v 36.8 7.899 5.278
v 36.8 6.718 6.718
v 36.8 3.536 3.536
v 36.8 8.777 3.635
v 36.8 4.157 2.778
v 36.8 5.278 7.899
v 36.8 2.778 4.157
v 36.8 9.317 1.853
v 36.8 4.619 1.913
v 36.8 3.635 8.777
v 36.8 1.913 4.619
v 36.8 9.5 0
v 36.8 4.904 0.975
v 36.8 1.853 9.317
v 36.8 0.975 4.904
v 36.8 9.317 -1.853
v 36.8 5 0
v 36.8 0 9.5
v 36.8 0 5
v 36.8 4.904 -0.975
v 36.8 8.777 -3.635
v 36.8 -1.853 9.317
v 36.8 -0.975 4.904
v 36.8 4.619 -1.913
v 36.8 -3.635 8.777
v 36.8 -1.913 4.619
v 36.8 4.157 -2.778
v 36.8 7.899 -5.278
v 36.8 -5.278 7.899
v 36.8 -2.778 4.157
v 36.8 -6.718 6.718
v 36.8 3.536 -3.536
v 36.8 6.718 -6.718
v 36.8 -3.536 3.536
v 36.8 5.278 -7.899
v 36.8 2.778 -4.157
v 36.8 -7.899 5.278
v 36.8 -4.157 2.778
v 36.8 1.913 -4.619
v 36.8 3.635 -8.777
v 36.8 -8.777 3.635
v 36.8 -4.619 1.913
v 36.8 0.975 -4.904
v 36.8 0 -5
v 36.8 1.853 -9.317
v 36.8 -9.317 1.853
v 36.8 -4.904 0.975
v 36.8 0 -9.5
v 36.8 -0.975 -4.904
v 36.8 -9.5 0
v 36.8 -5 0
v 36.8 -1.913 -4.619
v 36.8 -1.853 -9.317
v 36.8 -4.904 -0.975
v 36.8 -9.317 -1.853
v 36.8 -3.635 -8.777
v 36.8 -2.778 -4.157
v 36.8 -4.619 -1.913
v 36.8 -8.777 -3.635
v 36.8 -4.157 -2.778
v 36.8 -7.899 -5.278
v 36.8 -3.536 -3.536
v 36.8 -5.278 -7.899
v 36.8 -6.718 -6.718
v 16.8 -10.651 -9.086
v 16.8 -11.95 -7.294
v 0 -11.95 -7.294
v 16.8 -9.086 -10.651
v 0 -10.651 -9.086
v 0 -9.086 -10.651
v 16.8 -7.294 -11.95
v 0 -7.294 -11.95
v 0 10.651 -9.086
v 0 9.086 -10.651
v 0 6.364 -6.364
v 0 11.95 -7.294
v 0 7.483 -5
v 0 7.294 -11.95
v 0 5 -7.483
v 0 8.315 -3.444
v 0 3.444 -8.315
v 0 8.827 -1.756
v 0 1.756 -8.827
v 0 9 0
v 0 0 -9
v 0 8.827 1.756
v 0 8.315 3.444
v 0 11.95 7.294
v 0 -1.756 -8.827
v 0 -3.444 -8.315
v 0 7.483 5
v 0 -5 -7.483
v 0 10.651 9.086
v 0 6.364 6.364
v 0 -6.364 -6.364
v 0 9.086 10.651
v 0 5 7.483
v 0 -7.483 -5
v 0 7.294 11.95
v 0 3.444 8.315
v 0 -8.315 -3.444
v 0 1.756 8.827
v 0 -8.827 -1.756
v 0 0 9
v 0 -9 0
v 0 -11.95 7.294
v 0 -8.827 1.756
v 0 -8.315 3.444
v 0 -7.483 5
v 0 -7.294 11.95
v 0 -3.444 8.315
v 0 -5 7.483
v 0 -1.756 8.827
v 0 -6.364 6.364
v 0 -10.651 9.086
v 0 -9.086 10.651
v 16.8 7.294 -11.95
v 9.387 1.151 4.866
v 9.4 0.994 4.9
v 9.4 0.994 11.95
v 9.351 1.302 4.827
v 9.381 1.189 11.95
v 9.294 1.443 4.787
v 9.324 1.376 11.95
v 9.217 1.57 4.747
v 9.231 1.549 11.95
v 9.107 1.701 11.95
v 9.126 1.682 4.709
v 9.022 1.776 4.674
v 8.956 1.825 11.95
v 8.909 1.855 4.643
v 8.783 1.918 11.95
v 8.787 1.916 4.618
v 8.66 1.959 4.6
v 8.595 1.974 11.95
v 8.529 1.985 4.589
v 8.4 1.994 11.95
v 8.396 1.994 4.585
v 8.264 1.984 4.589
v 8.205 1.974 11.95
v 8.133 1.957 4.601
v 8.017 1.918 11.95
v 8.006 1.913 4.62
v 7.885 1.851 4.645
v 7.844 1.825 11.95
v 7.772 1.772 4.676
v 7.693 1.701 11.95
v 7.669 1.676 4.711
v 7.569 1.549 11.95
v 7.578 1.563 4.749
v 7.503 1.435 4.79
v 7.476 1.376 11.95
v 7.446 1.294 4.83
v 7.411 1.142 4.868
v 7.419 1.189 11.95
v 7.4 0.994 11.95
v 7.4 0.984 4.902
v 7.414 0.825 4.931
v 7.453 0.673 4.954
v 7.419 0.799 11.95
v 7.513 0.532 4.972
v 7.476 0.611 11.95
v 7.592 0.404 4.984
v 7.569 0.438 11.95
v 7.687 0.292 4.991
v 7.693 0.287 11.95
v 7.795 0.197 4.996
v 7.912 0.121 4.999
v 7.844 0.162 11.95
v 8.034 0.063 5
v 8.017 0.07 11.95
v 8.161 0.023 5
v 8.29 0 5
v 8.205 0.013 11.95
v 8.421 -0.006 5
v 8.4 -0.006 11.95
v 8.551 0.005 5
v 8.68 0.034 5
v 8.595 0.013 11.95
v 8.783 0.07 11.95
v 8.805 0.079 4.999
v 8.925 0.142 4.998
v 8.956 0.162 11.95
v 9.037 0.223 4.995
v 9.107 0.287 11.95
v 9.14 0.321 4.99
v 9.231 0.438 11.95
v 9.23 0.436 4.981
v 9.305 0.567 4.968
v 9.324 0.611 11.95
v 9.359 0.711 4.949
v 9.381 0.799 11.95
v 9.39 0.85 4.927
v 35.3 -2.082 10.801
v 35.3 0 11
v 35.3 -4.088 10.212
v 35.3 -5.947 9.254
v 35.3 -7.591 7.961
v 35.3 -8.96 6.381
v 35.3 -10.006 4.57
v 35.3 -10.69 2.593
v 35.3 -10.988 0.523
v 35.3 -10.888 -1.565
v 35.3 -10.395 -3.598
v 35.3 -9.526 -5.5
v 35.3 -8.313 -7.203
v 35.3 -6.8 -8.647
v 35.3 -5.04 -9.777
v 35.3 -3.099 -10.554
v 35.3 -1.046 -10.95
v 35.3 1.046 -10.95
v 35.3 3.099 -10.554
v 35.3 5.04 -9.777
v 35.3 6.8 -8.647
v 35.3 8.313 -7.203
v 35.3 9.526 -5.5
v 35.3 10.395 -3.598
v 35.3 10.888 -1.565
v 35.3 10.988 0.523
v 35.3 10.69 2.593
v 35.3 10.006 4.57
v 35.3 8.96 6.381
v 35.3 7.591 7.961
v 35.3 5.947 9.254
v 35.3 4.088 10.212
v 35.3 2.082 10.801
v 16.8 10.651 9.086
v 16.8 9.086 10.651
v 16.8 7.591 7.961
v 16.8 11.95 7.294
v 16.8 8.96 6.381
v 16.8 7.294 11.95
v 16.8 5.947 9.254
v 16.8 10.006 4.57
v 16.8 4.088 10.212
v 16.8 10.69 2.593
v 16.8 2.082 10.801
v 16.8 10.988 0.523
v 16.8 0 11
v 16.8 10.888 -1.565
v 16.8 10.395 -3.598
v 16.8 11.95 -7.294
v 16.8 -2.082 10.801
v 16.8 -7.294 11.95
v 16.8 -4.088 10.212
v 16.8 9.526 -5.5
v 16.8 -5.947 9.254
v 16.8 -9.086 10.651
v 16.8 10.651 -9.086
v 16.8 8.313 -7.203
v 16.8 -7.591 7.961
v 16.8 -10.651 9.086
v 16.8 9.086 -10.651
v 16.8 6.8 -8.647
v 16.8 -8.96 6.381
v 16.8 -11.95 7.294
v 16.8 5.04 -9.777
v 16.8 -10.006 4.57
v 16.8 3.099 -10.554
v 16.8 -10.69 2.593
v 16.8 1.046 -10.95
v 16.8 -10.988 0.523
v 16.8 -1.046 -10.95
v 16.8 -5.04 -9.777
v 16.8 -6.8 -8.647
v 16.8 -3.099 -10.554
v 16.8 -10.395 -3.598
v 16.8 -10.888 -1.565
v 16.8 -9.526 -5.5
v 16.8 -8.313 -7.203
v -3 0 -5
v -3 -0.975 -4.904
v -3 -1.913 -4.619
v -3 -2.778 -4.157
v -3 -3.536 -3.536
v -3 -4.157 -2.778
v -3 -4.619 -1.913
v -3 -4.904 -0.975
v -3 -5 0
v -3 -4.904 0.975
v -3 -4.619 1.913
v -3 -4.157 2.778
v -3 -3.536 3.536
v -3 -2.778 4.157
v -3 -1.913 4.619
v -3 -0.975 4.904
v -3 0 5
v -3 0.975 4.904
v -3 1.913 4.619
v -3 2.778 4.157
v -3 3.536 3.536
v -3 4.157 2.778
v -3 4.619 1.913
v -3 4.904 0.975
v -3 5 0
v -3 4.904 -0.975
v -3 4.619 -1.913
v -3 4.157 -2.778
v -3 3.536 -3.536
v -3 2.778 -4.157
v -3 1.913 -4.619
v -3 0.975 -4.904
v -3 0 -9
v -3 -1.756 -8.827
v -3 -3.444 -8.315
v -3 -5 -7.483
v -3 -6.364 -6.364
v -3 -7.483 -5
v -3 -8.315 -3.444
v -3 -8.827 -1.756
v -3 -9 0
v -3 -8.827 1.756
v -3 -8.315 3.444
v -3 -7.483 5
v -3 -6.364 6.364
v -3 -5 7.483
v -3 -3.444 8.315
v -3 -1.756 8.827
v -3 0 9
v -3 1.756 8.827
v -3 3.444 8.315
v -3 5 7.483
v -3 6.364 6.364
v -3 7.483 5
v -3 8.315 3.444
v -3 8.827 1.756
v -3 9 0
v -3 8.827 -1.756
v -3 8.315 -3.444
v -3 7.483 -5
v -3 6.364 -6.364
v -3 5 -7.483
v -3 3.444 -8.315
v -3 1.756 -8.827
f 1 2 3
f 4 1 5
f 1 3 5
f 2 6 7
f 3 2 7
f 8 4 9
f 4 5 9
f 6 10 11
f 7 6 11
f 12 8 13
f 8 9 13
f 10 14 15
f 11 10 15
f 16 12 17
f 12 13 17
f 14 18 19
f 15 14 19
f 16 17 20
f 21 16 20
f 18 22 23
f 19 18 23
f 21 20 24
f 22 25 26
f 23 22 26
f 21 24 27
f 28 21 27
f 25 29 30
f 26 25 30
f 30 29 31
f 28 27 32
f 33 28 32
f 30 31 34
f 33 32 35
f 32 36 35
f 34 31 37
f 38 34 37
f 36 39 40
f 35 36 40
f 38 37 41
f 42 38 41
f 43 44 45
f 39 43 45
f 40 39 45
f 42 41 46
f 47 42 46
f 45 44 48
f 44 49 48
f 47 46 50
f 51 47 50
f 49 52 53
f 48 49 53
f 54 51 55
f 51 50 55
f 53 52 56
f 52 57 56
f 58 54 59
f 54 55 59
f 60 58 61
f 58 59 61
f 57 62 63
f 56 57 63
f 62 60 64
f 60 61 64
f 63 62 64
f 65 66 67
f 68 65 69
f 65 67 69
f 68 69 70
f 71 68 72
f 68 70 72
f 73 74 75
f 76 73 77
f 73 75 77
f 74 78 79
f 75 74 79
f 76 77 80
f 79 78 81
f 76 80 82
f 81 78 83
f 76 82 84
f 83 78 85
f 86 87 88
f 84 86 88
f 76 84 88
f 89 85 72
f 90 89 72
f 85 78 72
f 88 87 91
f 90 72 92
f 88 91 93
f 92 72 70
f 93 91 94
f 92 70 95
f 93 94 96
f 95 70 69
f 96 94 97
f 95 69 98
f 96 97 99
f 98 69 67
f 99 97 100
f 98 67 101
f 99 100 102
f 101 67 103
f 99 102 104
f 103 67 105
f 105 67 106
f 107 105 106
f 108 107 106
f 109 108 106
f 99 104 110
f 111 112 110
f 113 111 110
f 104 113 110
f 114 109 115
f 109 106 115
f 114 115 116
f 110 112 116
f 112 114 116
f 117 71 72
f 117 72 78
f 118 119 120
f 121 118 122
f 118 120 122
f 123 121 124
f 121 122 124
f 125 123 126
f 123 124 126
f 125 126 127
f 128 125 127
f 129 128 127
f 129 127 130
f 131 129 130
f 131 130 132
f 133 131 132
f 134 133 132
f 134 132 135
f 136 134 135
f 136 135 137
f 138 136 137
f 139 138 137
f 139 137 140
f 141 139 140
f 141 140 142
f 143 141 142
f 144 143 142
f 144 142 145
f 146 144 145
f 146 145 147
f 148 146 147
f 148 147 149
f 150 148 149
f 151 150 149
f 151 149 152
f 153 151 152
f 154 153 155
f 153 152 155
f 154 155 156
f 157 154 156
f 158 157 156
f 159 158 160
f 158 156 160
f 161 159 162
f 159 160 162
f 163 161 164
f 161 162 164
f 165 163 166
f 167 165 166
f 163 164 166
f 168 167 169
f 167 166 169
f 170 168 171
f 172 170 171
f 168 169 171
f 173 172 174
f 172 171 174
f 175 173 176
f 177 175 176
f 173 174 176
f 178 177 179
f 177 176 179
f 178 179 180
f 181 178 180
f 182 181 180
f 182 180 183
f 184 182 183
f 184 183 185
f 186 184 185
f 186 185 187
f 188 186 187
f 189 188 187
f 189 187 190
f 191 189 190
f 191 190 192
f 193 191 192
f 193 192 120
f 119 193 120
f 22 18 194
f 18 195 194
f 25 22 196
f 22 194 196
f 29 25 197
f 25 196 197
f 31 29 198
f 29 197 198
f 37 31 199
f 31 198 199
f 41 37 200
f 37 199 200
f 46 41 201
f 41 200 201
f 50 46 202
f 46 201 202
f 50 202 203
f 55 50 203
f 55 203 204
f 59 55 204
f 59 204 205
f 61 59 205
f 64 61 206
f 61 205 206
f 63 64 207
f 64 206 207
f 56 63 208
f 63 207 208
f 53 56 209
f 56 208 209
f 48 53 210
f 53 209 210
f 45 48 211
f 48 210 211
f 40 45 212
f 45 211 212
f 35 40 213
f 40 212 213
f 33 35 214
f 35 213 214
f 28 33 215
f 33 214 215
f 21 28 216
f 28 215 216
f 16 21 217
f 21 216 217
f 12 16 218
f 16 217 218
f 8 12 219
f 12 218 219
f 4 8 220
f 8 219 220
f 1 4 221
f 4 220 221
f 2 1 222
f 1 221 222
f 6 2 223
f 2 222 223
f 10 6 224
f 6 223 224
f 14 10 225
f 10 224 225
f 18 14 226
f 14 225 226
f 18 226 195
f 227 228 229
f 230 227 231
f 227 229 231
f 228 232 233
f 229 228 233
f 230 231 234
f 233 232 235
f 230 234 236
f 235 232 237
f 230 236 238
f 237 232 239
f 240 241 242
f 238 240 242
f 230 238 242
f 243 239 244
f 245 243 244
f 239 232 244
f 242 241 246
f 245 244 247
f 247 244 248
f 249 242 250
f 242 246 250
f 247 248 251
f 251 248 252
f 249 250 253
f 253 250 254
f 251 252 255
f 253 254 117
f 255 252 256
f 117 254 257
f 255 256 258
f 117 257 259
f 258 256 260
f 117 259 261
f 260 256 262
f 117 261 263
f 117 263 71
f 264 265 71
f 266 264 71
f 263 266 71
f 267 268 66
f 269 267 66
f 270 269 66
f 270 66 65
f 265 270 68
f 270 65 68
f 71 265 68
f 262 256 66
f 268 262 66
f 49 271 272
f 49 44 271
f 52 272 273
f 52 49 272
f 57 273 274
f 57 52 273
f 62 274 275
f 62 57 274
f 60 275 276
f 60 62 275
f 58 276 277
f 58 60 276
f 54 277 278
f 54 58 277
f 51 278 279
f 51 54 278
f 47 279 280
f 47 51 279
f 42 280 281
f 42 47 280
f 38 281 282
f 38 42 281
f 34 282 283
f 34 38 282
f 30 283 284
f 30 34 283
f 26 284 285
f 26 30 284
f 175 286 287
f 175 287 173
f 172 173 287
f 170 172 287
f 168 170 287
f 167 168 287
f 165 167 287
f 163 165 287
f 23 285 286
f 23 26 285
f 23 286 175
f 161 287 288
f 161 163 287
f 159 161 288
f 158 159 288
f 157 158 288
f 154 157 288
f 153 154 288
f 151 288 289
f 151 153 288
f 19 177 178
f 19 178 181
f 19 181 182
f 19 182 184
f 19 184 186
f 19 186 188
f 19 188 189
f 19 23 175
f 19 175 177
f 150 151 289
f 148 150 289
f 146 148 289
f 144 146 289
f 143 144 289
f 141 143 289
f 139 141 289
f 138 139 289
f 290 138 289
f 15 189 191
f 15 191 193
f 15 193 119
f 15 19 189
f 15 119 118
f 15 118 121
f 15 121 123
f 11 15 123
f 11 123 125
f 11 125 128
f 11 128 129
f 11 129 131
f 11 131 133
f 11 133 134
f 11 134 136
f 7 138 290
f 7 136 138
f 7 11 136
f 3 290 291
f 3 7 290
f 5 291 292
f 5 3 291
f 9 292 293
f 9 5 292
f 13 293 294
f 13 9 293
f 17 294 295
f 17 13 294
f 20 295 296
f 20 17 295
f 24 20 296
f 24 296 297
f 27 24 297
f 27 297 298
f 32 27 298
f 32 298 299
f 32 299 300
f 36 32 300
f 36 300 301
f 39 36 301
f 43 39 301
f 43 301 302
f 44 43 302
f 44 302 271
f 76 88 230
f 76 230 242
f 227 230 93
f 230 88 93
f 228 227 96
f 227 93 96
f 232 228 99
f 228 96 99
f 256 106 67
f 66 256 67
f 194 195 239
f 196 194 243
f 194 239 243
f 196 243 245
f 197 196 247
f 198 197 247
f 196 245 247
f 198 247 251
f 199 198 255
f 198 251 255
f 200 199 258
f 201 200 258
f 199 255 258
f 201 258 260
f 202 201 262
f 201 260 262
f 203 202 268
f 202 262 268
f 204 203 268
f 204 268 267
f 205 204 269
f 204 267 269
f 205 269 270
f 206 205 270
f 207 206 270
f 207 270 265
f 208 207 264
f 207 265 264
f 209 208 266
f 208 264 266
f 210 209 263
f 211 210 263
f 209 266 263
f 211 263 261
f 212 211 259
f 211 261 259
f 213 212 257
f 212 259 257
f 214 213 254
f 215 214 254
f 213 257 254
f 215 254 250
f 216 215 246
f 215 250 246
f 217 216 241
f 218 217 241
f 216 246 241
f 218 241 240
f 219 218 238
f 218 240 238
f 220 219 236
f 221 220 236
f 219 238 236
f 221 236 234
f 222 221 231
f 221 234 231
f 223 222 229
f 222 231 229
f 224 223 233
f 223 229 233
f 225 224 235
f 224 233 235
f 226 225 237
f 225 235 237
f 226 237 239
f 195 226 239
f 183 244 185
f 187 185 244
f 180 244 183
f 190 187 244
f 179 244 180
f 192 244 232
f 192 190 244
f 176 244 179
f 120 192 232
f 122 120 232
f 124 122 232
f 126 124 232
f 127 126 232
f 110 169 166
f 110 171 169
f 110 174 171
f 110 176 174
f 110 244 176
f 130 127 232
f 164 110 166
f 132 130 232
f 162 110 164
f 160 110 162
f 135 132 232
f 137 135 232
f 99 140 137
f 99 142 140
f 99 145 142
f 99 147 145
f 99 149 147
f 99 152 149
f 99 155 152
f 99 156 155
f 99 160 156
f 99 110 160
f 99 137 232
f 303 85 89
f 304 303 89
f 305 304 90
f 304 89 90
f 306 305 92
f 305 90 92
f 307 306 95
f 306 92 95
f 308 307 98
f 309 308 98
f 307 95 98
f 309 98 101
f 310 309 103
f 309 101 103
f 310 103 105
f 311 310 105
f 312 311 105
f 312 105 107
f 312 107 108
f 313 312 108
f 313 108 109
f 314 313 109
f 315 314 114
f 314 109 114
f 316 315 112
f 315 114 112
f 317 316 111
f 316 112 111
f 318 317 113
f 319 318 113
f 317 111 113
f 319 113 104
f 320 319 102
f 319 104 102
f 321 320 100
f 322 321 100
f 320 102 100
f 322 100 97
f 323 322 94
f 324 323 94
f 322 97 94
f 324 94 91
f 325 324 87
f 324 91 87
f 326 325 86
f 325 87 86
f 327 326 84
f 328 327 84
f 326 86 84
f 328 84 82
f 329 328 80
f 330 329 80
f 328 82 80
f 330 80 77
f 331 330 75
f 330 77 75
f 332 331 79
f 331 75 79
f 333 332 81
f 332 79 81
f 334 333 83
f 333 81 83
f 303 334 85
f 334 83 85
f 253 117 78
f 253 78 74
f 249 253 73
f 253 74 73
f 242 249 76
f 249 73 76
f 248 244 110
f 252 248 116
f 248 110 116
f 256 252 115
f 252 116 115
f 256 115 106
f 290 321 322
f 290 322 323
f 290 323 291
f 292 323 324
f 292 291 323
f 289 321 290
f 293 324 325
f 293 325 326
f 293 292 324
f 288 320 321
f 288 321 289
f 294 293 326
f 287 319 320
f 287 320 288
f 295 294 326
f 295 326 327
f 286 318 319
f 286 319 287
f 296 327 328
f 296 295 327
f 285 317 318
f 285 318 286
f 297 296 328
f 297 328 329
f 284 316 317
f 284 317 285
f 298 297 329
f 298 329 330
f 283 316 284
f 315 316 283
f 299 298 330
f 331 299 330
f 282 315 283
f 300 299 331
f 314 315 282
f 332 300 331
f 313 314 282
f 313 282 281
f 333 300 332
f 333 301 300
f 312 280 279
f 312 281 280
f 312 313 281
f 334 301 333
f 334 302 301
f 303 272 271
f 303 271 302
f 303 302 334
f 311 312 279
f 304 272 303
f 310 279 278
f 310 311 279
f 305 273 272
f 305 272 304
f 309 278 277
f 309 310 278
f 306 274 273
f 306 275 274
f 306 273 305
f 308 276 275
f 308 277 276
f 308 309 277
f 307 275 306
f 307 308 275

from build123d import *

# Parameters (mm, degrees)
CROQUIS2_OUTSIDE_W      = 40.812
CROQUIS2_OUTSIDE_H      = 40.812
CROQUIS2_OUTSIDE_W_2    = 23.9
CROQUIS2_OUTSIDE_H_2    = 23.9
CORTAR_EXTRUIR1_DEPTH   = 42.788036566
CROQUIS4_R              = 5
CORTAR_EXTRUIR2_DEPTH   = 41.494999691
CROQUIS3_R              = 1
CORTAR_EXTRUIR3_DEPTH   = 13
CROQUIS5_R              = 9
CROQUIS5_R_2            = 5
SALIENTE_EXTRUIR1_DEPTH = 3


with BuildPart() as part:
    # Croquis1 → Revolución1 (revolve)
    with BuildSketch(Plane(origin=(0, 0, 0), x_dir=(1, 0, 0), z_dir=(0, 1, 0)), mode=Mode.PRIVATE) as revoluci_n1_sk:
        Polygon((0, 0), (36.8, 0), (36.8, 9.5), (35.3, 11), (16.8, 11), (16.8, 14), (0, 14), align=None)
    revolve(revoluci_n1_sk.sketch.rotate(Axis((0, 0, 0), (1, 0, 0)), 180), axis=Axis((0, 0, 0), (1, 0, 0)))

    # Croquis2 outside → Cortar-Extruir1 (cut, through all)
    with BuildSketch(Plane(origin=(0, 0, 0), x_dir=(0, 0, -1), z_dir=(1, 0, 0))):
        Rectangle(CROQUIS2_OUTSIDE_W, CROQUIS2_OUTSIDE_H)
        Rectangle(CROQUIS2_OUTSIDE_W_2, CROQUIS2_OUTSIDE_H_2, mode=Mode.SUBTRACT)
    extrude(amount=CORTAR_EXTRUIR1_DEPTH, mode=Mode.SUBTRACT)

    # Croquis4 → Cortar-Extruir2 (cut, through all)
    with BuildSketch(Plane(origin=(36.8, 0, 0), x_dir=(0, 0, -1), z_dir=(1, 0, 0))):
        Circle(CROQUIS4_R)
    extrude(amount=-CORTAR_EXTRUIR2_DEPTH, mode=Mode.SUBTRACT)

    # Croquis3 → Cortar-Extruir3 (cut)
    with BuildSketch(Plane.XY.offset(11.95)):
        with Locations((8.4, 0.993661632)):
            Circle(CROQUIS3_R)
    extrude(amount=-CORTAR_EXTRUIR3_DEPTH, mode=Mode.SUBTRACT)

    # Croquis5 → Saliente-Extruir1 (add)
    with BuildSketch(Plane.ZY):
        with Locations(Location((0, 0, 0), (0, 0, 180))):
            Circle(CROQUIS5_R)
        with Locations(Location((0, 0, 0), (0, 0, 180))):
            Circle(CROQUIS5_R_2, mode=Mode.SUBTRACT)
    extrude(amount=SALIENTE_EXTRUIR1_DEPTH)


solid = part.part
